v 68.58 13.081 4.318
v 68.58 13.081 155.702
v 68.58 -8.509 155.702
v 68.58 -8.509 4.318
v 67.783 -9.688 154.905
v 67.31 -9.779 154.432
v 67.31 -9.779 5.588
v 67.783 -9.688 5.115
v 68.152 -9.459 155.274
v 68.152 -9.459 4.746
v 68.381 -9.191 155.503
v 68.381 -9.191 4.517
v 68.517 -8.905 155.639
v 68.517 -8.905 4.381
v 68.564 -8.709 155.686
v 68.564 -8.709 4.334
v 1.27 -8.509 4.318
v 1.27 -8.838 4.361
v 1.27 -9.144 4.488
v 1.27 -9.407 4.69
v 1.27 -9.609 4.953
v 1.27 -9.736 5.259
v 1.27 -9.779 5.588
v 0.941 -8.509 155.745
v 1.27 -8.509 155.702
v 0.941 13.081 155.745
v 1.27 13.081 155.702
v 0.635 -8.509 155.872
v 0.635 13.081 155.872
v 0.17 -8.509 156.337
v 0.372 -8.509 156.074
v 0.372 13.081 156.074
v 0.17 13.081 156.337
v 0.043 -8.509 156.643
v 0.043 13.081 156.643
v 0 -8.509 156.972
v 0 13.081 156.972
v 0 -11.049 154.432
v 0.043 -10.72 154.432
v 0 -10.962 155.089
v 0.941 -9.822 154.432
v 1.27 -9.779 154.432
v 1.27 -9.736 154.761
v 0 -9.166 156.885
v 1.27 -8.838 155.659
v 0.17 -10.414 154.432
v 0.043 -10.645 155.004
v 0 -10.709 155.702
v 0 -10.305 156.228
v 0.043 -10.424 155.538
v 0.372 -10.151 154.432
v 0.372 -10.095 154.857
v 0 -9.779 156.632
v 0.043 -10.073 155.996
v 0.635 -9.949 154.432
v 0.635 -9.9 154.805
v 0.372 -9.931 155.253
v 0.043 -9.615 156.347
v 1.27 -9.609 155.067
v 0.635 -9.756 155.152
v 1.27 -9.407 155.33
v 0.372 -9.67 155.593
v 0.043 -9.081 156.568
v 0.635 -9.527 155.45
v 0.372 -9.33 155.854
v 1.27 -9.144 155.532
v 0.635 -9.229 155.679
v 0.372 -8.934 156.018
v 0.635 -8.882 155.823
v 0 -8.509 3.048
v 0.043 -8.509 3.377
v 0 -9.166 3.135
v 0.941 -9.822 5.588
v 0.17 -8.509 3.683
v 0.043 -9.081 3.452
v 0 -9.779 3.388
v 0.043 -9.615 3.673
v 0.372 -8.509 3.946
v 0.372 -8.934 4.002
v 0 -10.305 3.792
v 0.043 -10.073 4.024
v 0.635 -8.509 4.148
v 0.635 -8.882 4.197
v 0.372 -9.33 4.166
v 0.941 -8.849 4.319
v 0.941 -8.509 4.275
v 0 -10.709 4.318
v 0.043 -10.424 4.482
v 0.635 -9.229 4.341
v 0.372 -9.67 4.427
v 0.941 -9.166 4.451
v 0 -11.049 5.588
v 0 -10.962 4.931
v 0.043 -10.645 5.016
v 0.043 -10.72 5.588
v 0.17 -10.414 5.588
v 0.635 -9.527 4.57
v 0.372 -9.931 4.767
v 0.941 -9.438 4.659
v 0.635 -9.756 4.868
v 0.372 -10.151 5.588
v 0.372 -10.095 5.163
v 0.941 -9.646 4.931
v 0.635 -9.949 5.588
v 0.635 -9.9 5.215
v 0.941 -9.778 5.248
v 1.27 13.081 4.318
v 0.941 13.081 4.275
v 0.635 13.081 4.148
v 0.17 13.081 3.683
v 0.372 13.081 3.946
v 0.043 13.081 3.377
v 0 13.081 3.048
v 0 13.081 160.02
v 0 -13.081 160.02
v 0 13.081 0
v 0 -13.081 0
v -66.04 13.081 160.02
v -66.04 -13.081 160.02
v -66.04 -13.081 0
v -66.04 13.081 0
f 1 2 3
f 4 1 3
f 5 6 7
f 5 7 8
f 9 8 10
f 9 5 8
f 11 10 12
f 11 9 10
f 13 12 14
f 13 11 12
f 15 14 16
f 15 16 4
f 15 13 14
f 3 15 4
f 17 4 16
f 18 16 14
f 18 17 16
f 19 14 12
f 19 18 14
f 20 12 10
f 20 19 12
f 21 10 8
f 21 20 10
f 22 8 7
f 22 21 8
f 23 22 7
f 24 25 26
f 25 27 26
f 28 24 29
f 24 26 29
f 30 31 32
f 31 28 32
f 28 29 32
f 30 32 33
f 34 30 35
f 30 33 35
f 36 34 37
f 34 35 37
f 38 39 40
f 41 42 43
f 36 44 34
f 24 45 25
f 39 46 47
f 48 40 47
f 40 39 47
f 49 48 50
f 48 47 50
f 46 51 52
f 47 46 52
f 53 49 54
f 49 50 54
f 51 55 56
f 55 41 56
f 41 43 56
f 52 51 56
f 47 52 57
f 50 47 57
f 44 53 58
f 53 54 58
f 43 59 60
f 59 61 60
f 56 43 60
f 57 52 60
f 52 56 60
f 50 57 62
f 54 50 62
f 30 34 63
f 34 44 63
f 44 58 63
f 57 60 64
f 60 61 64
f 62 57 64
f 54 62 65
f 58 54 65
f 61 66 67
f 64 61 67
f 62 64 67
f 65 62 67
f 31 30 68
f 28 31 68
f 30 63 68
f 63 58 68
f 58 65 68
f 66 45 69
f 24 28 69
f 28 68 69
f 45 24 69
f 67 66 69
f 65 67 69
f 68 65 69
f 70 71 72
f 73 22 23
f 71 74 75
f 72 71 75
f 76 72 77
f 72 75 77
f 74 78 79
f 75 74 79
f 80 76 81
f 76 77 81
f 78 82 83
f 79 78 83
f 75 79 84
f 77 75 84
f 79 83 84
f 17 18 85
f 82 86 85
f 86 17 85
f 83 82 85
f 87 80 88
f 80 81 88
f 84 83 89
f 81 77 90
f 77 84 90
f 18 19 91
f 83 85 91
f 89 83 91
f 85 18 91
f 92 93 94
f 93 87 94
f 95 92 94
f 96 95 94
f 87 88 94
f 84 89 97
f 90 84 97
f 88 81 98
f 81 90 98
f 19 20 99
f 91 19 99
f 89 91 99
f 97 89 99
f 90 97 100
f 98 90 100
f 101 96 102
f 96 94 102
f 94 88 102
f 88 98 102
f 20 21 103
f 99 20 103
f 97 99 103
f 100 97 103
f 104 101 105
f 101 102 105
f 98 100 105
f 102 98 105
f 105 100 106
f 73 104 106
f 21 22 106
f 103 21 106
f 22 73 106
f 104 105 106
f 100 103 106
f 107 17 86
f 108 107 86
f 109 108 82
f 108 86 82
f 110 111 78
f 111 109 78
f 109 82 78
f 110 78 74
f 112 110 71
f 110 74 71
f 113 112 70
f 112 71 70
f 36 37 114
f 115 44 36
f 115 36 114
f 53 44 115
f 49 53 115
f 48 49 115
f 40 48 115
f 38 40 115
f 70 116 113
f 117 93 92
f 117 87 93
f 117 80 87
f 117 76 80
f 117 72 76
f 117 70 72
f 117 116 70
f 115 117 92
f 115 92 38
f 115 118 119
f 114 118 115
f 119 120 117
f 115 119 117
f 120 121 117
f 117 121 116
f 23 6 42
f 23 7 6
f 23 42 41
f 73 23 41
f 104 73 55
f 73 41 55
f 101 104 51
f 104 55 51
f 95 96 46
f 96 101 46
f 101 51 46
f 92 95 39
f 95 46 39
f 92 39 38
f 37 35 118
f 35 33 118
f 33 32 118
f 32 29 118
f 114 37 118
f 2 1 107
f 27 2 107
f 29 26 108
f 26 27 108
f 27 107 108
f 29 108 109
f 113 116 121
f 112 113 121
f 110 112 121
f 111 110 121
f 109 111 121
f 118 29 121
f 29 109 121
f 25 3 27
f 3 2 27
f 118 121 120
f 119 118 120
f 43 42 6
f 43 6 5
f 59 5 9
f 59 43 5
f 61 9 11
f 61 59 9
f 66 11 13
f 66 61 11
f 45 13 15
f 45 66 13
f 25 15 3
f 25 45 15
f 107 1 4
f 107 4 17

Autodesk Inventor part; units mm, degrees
ref_plane "YZ Plane" through (0, 0, 0) normal (1, 0, 0) x (0, 1, 0)
ref_plane "XZ Plane" through (0, 0, 0) normal (0, 1, 0) x (-1, 0, 0)
sketch "Sketch1" plane through (0, 0, 0) normal (0, 0, 1) x (1, 0, 0)
  line L0 (0, 11.43) -> (0, -11.43)
  line L1 (0, 13.081) -> (-66.04, 13.081)
  line L2 (-66.04, 13.081) -> (-66.04, -13.081)
  line L3 (-66.04, -13.081) -> (0, -13.081)
  line L4 (0, -13.081) -> (0, 13.081)
  point P0 (0, 0)
  point P1 (0, 0)
  dimension "d1" = 26.162
  dimension "d3" = 66.04
extrude "Extrusion1" add sketch "Sketch1" along normal blind 160.02
ref_plane "Work Plane1" through (0, 0, 4.318) normal (0, 0, -1) x (-1, 0, 0)
sketch "Sketch3" plane through (0, 0, 4.318) normal (0, 0, -1) x (-1, 0, 0)
  line L0 (0, 13.081) -> (-68.58, 13.081)
  line L1 (-68.58, 13.081) -> (-68.58, -9.779)
  line L2 (-68.58, -9.779) -> (0, -9.779)
  line L3 (0, -9.779) -> (0, 13.081)
  line L4 (0, -13.081) -> (0, 13.081) projected
  line L5 (66.04, 13.081) -> (66.04, -13.081) projected
  line L6 (0, 13.081) -> (66.04, 13.081) projected
  point P0 (0, 0)
  point P1 (0, 0)
  dimension "d13" = 22.86
  dimension "d14" = 134.62
extrude "Extrusion3" add sketch "Sketch3" against normal blind 151.384
fillet "Fillet1" radius 1.27 6 edges at (34.29, -9.779, 4.318) (68.58, -9.779, 80.01) (34.29, -9.779, 155.702) (0, -9.779, 80.01) (0, 1.651, 155.702) (0, 1.651, 4.318)
properties part number "BatteryInBag"
